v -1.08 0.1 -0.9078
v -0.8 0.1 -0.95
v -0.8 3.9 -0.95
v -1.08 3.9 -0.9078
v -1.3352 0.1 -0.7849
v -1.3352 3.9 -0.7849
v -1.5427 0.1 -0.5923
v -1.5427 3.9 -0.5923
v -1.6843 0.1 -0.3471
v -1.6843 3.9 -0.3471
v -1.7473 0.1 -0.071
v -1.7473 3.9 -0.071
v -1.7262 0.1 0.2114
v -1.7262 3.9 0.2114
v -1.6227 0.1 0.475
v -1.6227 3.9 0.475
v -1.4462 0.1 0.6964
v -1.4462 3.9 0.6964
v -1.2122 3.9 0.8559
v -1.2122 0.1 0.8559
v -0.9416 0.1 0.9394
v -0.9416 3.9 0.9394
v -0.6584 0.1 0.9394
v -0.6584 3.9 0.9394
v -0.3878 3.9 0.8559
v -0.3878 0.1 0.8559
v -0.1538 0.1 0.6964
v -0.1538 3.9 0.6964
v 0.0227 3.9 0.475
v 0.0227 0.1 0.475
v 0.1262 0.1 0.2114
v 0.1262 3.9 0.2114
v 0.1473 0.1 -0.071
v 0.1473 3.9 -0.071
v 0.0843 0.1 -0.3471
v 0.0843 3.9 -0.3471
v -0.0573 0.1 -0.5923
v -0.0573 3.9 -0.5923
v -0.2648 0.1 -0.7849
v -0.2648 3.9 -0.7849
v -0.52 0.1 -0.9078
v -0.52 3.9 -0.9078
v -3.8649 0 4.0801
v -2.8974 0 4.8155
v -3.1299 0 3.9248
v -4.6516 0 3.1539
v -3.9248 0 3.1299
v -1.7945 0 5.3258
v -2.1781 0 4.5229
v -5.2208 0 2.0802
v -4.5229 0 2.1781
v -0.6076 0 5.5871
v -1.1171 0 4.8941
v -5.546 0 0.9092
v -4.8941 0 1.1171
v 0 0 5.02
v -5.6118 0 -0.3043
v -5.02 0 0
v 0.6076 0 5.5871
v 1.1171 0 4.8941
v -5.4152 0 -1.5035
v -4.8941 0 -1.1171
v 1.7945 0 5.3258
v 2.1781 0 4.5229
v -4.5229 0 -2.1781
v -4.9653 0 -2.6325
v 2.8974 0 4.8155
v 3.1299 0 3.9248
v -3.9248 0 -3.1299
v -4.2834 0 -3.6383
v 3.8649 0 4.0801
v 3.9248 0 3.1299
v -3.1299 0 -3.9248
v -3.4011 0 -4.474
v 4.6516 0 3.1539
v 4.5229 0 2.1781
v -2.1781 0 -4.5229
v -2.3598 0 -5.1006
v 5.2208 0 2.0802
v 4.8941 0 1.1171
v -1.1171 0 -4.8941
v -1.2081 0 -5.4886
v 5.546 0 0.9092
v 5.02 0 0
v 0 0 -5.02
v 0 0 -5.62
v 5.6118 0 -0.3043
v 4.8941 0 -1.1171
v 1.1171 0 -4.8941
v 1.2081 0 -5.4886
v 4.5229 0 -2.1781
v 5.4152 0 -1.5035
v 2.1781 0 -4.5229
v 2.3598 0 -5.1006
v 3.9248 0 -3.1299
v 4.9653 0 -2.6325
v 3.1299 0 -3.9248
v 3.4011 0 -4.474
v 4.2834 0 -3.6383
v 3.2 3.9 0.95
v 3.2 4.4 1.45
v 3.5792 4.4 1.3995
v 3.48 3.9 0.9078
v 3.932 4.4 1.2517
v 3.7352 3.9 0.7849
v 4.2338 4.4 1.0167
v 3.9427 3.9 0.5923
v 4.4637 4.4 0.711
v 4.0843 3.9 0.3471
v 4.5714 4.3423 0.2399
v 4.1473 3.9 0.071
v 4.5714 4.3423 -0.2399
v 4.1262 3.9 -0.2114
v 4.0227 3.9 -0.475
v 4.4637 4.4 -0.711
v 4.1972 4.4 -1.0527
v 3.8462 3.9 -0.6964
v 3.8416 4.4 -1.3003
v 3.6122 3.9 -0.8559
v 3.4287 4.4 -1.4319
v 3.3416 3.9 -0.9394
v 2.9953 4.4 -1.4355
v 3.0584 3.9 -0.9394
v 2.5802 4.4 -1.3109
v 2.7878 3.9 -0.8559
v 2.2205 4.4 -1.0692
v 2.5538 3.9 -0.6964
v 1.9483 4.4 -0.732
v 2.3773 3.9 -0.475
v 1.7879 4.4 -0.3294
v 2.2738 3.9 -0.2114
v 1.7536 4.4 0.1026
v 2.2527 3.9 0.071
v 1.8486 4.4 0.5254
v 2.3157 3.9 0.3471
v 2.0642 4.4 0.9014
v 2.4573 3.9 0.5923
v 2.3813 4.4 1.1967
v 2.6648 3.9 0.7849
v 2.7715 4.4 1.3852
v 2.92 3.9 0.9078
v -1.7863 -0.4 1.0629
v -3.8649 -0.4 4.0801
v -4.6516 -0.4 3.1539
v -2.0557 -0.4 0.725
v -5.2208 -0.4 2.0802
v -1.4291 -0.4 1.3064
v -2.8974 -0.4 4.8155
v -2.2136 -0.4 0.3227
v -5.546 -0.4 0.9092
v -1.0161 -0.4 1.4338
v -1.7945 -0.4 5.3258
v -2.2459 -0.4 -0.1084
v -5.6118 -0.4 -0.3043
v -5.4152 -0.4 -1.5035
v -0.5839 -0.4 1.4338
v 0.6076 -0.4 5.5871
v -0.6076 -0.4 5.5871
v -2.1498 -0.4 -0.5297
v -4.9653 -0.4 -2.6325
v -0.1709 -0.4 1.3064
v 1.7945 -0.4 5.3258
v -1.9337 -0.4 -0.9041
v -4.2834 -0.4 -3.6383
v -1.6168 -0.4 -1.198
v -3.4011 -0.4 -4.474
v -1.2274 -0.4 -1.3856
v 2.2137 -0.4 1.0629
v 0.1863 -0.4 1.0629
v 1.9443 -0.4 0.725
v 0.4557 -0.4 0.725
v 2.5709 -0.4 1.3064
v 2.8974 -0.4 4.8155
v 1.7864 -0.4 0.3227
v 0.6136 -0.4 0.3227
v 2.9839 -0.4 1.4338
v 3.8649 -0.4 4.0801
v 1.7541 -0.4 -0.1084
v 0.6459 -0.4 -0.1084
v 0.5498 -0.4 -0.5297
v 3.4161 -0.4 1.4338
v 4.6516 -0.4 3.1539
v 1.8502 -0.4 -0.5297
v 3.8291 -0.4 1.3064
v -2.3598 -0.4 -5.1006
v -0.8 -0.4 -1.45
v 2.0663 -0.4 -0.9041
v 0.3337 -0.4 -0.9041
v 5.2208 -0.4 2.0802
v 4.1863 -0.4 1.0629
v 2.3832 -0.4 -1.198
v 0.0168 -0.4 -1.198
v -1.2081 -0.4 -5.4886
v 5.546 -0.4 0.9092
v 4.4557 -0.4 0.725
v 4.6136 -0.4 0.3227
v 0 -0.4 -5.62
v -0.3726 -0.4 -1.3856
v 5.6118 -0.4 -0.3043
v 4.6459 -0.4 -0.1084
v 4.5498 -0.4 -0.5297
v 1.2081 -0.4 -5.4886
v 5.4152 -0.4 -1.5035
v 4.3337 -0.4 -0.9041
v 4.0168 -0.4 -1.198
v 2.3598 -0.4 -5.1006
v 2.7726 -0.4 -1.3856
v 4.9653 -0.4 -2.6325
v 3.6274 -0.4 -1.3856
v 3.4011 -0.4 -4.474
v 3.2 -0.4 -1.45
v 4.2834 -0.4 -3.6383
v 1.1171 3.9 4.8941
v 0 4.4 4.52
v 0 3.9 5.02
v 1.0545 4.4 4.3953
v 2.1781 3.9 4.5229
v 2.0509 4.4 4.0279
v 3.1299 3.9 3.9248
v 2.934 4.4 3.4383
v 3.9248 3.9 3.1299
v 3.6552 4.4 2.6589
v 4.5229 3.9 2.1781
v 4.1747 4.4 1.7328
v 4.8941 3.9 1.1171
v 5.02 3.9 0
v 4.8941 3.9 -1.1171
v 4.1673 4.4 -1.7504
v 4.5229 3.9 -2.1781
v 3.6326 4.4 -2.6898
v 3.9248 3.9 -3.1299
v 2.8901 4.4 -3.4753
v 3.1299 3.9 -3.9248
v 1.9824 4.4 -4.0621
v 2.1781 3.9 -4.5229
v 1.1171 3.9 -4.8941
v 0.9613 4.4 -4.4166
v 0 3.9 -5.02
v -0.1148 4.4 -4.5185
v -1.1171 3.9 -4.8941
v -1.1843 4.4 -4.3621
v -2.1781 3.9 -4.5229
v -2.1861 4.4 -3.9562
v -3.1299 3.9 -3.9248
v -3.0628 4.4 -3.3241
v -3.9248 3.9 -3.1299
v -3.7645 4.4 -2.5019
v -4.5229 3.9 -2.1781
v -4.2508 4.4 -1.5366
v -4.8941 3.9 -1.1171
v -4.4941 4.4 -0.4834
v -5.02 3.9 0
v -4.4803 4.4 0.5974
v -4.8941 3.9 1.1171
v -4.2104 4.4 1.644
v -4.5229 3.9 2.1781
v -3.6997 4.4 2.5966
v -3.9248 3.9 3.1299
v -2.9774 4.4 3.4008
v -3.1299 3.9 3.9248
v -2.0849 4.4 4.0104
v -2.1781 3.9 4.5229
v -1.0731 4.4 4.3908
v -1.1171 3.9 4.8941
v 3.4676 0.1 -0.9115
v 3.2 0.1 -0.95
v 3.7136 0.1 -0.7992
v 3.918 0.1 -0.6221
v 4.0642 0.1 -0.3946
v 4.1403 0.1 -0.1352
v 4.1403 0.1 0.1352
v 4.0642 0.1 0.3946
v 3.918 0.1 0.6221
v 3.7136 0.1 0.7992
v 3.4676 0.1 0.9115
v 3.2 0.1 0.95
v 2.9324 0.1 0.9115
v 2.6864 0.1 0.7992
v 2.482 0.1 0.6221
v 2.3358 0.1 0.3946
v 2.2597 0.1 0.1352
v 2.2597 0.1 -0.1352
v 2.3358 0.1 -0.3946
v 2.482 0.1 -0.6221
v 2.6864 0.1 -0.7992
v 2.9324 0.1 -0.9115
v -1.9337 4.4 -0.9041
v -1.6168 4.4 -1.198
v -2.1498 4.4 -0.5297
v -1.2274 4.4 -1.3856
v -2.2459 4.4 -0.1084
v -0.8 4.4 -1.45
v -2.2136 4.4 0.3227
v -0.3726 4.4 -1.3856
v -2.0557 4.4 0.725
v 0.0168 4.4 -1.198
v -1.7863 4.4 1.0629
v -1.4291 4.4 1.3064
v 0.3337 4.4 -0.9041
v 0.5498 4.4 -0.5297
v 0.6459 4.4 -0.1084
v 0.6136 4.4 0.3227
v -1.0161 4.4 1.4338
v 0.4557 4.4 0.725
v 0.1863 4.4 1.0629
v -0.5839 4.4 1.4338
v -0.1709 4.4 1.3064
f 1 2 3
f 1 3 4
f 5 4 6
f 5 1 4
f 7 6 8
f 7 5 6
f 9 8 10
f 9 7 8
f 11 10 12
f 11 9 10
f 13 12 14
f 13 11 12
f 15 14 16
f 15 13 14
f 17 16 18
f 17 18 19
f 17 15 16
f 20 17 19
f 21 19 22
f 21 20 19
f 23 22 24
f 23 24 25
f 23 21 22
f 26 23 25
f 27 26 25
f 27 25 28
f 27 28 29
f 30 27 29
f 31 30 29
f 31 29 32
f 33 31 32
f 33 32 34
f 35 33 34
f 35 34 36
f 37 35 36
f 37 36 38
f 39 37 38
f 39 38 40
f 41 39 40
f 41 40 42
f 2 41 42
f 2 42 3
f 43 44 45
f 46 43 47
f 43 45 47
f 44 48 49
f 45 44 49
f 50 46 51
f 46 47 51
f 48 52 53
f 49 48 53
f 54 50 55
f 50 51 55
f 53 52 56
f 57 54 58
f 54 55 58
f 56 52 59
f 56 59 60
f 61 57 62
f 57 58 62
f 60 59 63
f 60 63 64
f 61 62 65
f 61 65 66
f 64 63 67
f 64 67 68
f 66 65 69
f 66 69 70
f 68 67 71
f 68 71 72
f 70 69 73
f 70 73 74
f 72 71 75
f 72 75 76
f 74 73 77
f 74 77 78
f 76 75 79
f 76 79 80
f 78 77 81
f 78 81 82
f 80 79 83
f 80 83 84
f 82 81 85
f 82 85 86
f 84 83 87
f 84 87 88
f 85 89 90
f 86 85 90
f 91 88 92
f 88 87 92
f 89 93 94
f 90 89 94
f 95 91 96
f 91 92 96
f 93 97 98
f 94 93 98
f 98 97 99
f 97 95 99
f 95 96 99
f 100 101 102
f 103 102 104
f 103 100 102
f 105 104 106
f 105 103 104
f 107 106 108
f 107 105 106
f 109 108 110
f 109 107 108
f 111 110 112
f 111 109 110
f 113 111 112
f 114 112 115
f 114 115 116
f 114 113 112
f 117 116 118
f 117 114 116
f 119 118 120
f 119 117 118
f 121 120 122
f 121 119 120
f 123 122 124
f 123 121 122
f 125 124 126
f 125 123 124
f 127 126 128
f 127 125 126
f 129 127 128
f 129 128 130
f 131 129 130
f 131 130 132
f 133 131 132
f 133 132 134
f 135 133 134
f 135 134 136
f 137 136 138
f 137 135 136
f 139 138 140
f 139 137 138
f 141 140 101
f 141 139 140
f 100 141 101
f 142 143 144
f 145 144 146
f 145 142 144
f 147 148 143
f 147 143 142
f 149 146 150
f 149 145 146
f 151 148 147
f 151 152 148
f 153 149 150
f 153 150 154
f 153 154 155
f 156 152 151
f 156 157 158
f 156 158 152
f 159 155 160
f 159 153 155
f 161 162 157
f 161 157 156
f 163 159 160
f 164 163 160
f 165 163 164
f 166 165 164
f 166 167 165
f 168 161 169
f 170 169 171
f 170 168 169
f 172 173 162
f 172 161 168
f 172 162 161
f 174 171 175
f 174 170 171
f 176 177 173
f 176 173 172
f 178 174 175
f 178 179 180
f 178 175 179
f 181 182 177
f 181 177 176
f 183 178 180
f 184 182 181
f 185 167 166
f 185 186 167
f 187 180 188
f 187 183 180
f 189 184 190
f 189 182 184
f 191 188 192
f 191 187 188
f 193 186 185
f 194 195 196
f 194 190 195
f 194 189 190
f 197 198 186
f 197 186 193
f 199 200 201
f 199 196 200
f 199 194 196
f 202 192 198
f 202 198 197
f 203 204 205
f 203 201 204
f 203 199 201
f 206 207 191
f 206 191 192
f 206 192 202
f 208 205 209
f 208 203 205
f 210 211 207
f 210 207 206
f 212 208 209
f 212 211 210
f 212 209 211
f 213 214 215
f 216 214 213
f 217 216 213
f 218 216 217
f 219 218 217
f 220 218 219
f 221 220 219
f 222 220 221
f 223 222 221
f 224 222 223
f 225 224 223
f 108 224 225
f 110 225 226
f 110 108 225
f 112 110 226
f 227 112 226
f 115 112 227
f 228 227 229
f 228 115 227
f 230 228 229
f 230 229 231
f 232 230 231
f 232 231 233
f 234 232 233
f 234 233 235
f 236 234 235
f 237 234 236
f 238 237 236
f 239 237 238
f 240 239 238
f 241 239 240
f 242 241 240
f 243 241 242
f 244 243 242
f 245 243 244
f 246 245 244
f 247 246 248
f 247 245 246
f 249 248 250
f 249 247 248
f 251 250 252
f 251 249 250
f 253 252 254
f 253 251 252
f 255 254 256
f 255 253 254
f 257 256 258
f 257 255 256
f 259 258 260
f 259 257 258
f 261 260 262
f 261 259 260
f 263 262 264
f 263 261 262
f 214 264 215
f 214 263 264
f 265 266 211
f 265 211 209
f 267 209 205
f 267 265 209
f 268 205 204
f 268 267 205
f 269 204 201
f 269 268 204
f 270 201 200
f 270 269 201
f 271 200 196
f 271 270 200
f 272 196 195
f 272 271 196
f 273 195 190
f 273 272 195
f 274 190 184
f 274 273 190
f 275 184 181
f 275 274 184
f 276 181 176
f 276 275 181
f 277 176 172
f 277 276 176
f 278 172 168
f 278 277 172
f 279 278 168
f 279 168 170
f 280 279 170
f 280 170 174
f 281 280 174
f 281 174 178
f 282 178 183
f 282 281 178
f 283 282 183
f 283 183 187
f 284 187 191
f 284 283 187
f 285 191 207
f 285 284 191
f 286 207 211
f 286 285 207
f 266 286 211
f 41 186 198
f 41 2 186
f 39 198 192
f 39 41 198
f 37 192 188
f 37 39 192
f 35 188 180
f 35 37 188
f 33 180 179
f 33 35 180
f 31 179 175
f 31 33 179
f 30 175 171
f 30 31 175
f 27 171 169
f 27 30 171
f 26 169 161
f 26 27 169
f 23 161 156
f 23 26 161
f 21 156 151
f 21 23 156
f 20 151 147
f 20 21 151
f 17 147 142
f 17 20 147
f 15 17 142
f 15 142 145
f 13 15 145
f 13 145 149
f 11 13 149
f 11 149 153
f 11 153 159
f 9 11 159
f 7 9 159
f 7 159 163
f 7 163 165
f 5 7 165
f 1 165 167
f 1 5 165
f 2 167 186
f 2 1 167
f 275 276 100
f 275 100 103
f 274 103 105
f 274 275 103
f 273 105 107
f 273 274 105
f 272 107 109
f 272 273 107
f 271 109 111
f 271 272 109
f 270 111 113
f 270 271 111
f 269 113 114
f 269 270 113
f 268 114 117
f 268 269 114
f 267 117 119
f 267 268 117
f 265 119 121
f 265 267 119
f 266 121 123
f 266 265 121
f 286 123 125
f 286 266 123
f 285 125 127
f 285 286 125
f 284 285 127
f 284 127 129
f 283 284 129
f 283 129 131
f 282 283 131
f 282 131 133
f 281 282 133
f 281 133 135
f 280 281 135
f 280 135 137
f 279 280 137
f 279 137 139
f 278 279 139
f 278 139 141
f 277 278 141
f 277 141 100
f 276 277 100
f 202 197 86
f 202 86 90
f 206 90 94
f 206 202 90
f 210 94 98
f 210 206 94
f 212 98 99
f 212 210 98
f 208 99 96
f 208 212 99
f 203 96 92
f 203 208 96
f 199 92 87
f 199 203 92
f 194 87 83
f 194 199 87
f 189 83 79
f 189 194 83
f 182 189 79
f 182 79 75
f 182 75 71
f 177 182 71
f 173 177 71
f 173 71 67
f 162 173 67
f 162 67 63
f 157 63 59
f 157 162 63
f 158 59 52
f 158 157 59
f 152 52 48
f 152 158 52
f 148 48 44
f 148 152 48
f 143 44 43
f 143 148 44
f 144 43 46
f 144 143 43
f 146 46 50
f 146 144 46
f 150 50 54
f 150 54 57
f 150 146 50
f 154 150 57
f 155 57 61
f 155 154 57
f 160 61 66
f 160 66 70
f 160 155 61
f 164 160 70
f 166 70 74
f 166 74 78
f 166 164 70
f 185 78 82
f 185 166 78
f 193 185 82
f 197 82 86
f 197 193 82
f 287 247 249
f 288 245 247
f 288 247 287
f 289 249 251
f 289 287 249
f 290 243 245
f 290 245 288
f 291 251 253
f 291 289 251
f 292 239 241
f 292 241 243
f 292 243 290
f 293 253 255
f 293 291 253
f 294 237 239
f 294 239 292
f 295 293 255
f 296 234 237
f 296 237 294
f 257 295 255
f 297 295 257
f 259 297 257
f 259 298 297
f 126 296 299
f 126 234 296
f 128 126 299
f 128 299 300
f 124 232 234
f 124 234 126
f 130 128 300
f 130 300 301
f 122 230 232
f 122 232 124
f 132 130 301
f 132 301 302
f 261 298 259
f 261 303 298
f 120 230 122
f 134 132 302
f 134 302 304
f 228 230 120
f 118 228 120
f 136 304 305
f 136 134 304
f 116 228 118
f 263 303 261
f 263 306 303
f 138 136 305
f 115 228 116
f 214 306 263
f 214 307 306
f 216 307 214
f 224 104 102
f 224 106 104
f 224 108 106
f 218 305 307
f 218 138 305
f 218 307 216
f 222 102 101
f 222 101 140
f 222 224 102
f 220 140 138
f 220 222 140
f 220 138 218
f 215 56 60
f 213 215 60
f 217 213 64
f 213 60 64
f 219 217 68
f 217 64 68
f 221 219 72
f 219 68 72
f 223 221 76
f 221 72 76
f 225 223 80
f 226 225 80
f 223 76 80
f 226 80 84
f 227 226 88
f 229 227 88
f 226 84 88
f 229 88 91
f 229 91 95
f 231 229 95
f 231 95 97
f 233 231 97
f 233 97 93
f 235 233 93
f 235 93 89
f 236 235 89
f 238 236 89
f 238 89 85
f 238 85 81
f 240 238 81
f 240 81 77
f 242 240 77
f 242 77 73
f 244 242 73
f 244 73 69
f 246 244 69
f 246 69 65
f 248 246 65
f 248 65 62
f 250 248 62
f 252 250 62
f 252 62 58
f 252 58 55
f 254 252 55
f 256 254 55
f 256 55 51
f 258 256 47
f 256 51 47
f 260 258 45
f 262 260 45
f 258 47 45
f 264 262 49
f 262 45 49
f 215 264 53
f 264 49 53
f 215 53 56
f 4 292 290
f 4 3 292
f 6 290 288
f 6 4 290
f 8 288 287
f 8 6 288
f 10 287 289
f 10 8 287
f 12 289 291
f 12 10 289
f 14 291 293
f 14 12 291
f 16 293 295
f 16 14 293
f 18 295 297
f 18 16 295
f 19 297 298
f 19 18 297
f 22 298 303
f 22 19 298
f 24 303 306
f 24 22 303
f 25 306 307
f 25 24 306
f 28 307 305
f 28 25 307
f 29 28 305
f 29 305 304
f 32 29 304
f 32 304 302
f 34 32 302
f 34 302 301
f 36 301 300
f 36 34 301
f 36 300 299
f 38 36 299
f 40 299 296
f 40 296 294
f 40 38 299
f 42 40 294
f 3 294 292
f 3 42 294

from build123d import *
from build123d.topology import SkipClean

# Parameters (mm, degrees)
SKETCH_1_R      = 5.02
SKETCH_1_R_2    = 0.95
EXTRUDE_1_DEPTH = 4.4
EXTRUDE_START   = 0.4
SKETCH_3_R      = 5.62
SKETCH_3_R_2    = 0.95
EXTRUDE_2_DEPTH = 0.4
CHAMFER_1_SIZE  = 0.5


with BuildPart() as part:
    # 草图1 → 凸台-拉伸1 (new body)
    with BuildSketch(Plane(origin=(0, 0, 0), x_dir=(1, 0, 0), z_dir=(0, 1, 0))):
        with Locations(Location((0, 0, 0), (0, 0, 270))):
            Circle(SKETCH_1_R)
        with Locations(Location((3.2, 0, 0), (0, 0, 270))):
            Circle(SKETCH_1_R_2, mode=Mode.SUBTRACT)
        with Locations(Location((-0.8, 0, 0), (0, 0, 90))):
            Circle(SKETCH_1_R_2, mode=Mode.SUBTRACT)
    extrude(amount=EXTRUDE_1_DEPTH)

    # 草图3 → 凸台-拉伸2 (add)
    with SkipClean():  # the faces are left unmerged after this step: merging them gives an invalid solid
        with BuildSketch(Plane.XZ.offset(EXTRUDE_START)):
            with Locations(Location((0, 0, 0), (0, 0, 270))):
                Circle(SKETCH_3_R)
            with Locations(Location((3.2, 0, 0), (0, 0, 270))):
                Circle(SKETCH_3_R_2, mode=Mode.SUBTRACT)
            with Locations(Location((-0.8, 0, 0), (0, 0, 270))):
                Circle(SKETCH_3_R_2, mode=Mode.SUBTRACT)
        extrude(amount=-EXTRUDE_2_DEPTH)

    # 倒角1
    # the kernel refuses this chamfer: 0.5 mm, written as the material it takes off along each edge
    with BuildSketch(Plane(origin=(3.2, -0.4, 0), x_dir=(0, 0, -1), z_dir=(-1, 0, 0))) as chamfer_1_piece_1:
        Polygon((0.95 + CHAMFER_1_SIZE, 0), (0.95, -CHAMFER_1_SIZE), (0.95, 0), align=None)
    revolve(axis=Axis((3.2, -0.4, 0), (0, -1, 0)), mode=Mode.SUBTRACT)
    with BuildSketch(Plane(origin=(-0.8, -0.4, 0), x_dir=(0, 0, -1), z_dir=(-1, 0, 0))) as chamfer_1_piece_2:
        Polygon((0.95 + CHAMFER_1_SIZE, 0), (0.95, -CHAMFER_1_SIZE), (0.95, 0), align=None)
    revolve(axis=Axis((-0.8, -0.4, 0), (0, -1, 0)), mode=Mode.SUBTRACT)
    with BuildSketch(Plane(origin=(0, 4.4, 0), x_dir=(0, 0, 1), z_dir=(-1, 0, 0))) as chamfer_1_piece_3:
        Polygon((5.02, -CHAMFER_1_SIZE), (5.02 - CHAMFER_1_SIZE, 0), (5.02, 0), align=None)
    revolve(axis=Axis((0, 4.4, 0), (0, 1, 0)), mode=Mode.SUBTRACT)
    with BuildSketch(Plane(origin=(3.2, 4.4, 0), x_dir=(0, 0, 1), z_dir=(-1, 0, 0))) as chamfer_1_piece_4:
        Polygon((0.95 + CHAMFER_1_SIZE, 0), (0.95, -CHAMFER_1_SIZE), (0.95, 0), align=None)
    revolve(axis=Axis((3.2, 4.4, 0), (0, 1, 0)), mode=Mode.SUBTRACT)
    with BuildSketch(Plane(origin=(-0.8, 4.4, 0), x_dir=(0, 0, -1), z_dir=(1, 0, 0))) as chamfer_1_piece_5:
        Polygon((0.95 + CHAMFER_1_SIZE, 0), (0.95, -CHAMFER_1_SIZE), (0.95, 0), align=None)
    revolve(axis=Axis((-0.8, 4.4, 0), (0, 1, 0)), mode=Mode.SUBTRACT)


solid = part.part
